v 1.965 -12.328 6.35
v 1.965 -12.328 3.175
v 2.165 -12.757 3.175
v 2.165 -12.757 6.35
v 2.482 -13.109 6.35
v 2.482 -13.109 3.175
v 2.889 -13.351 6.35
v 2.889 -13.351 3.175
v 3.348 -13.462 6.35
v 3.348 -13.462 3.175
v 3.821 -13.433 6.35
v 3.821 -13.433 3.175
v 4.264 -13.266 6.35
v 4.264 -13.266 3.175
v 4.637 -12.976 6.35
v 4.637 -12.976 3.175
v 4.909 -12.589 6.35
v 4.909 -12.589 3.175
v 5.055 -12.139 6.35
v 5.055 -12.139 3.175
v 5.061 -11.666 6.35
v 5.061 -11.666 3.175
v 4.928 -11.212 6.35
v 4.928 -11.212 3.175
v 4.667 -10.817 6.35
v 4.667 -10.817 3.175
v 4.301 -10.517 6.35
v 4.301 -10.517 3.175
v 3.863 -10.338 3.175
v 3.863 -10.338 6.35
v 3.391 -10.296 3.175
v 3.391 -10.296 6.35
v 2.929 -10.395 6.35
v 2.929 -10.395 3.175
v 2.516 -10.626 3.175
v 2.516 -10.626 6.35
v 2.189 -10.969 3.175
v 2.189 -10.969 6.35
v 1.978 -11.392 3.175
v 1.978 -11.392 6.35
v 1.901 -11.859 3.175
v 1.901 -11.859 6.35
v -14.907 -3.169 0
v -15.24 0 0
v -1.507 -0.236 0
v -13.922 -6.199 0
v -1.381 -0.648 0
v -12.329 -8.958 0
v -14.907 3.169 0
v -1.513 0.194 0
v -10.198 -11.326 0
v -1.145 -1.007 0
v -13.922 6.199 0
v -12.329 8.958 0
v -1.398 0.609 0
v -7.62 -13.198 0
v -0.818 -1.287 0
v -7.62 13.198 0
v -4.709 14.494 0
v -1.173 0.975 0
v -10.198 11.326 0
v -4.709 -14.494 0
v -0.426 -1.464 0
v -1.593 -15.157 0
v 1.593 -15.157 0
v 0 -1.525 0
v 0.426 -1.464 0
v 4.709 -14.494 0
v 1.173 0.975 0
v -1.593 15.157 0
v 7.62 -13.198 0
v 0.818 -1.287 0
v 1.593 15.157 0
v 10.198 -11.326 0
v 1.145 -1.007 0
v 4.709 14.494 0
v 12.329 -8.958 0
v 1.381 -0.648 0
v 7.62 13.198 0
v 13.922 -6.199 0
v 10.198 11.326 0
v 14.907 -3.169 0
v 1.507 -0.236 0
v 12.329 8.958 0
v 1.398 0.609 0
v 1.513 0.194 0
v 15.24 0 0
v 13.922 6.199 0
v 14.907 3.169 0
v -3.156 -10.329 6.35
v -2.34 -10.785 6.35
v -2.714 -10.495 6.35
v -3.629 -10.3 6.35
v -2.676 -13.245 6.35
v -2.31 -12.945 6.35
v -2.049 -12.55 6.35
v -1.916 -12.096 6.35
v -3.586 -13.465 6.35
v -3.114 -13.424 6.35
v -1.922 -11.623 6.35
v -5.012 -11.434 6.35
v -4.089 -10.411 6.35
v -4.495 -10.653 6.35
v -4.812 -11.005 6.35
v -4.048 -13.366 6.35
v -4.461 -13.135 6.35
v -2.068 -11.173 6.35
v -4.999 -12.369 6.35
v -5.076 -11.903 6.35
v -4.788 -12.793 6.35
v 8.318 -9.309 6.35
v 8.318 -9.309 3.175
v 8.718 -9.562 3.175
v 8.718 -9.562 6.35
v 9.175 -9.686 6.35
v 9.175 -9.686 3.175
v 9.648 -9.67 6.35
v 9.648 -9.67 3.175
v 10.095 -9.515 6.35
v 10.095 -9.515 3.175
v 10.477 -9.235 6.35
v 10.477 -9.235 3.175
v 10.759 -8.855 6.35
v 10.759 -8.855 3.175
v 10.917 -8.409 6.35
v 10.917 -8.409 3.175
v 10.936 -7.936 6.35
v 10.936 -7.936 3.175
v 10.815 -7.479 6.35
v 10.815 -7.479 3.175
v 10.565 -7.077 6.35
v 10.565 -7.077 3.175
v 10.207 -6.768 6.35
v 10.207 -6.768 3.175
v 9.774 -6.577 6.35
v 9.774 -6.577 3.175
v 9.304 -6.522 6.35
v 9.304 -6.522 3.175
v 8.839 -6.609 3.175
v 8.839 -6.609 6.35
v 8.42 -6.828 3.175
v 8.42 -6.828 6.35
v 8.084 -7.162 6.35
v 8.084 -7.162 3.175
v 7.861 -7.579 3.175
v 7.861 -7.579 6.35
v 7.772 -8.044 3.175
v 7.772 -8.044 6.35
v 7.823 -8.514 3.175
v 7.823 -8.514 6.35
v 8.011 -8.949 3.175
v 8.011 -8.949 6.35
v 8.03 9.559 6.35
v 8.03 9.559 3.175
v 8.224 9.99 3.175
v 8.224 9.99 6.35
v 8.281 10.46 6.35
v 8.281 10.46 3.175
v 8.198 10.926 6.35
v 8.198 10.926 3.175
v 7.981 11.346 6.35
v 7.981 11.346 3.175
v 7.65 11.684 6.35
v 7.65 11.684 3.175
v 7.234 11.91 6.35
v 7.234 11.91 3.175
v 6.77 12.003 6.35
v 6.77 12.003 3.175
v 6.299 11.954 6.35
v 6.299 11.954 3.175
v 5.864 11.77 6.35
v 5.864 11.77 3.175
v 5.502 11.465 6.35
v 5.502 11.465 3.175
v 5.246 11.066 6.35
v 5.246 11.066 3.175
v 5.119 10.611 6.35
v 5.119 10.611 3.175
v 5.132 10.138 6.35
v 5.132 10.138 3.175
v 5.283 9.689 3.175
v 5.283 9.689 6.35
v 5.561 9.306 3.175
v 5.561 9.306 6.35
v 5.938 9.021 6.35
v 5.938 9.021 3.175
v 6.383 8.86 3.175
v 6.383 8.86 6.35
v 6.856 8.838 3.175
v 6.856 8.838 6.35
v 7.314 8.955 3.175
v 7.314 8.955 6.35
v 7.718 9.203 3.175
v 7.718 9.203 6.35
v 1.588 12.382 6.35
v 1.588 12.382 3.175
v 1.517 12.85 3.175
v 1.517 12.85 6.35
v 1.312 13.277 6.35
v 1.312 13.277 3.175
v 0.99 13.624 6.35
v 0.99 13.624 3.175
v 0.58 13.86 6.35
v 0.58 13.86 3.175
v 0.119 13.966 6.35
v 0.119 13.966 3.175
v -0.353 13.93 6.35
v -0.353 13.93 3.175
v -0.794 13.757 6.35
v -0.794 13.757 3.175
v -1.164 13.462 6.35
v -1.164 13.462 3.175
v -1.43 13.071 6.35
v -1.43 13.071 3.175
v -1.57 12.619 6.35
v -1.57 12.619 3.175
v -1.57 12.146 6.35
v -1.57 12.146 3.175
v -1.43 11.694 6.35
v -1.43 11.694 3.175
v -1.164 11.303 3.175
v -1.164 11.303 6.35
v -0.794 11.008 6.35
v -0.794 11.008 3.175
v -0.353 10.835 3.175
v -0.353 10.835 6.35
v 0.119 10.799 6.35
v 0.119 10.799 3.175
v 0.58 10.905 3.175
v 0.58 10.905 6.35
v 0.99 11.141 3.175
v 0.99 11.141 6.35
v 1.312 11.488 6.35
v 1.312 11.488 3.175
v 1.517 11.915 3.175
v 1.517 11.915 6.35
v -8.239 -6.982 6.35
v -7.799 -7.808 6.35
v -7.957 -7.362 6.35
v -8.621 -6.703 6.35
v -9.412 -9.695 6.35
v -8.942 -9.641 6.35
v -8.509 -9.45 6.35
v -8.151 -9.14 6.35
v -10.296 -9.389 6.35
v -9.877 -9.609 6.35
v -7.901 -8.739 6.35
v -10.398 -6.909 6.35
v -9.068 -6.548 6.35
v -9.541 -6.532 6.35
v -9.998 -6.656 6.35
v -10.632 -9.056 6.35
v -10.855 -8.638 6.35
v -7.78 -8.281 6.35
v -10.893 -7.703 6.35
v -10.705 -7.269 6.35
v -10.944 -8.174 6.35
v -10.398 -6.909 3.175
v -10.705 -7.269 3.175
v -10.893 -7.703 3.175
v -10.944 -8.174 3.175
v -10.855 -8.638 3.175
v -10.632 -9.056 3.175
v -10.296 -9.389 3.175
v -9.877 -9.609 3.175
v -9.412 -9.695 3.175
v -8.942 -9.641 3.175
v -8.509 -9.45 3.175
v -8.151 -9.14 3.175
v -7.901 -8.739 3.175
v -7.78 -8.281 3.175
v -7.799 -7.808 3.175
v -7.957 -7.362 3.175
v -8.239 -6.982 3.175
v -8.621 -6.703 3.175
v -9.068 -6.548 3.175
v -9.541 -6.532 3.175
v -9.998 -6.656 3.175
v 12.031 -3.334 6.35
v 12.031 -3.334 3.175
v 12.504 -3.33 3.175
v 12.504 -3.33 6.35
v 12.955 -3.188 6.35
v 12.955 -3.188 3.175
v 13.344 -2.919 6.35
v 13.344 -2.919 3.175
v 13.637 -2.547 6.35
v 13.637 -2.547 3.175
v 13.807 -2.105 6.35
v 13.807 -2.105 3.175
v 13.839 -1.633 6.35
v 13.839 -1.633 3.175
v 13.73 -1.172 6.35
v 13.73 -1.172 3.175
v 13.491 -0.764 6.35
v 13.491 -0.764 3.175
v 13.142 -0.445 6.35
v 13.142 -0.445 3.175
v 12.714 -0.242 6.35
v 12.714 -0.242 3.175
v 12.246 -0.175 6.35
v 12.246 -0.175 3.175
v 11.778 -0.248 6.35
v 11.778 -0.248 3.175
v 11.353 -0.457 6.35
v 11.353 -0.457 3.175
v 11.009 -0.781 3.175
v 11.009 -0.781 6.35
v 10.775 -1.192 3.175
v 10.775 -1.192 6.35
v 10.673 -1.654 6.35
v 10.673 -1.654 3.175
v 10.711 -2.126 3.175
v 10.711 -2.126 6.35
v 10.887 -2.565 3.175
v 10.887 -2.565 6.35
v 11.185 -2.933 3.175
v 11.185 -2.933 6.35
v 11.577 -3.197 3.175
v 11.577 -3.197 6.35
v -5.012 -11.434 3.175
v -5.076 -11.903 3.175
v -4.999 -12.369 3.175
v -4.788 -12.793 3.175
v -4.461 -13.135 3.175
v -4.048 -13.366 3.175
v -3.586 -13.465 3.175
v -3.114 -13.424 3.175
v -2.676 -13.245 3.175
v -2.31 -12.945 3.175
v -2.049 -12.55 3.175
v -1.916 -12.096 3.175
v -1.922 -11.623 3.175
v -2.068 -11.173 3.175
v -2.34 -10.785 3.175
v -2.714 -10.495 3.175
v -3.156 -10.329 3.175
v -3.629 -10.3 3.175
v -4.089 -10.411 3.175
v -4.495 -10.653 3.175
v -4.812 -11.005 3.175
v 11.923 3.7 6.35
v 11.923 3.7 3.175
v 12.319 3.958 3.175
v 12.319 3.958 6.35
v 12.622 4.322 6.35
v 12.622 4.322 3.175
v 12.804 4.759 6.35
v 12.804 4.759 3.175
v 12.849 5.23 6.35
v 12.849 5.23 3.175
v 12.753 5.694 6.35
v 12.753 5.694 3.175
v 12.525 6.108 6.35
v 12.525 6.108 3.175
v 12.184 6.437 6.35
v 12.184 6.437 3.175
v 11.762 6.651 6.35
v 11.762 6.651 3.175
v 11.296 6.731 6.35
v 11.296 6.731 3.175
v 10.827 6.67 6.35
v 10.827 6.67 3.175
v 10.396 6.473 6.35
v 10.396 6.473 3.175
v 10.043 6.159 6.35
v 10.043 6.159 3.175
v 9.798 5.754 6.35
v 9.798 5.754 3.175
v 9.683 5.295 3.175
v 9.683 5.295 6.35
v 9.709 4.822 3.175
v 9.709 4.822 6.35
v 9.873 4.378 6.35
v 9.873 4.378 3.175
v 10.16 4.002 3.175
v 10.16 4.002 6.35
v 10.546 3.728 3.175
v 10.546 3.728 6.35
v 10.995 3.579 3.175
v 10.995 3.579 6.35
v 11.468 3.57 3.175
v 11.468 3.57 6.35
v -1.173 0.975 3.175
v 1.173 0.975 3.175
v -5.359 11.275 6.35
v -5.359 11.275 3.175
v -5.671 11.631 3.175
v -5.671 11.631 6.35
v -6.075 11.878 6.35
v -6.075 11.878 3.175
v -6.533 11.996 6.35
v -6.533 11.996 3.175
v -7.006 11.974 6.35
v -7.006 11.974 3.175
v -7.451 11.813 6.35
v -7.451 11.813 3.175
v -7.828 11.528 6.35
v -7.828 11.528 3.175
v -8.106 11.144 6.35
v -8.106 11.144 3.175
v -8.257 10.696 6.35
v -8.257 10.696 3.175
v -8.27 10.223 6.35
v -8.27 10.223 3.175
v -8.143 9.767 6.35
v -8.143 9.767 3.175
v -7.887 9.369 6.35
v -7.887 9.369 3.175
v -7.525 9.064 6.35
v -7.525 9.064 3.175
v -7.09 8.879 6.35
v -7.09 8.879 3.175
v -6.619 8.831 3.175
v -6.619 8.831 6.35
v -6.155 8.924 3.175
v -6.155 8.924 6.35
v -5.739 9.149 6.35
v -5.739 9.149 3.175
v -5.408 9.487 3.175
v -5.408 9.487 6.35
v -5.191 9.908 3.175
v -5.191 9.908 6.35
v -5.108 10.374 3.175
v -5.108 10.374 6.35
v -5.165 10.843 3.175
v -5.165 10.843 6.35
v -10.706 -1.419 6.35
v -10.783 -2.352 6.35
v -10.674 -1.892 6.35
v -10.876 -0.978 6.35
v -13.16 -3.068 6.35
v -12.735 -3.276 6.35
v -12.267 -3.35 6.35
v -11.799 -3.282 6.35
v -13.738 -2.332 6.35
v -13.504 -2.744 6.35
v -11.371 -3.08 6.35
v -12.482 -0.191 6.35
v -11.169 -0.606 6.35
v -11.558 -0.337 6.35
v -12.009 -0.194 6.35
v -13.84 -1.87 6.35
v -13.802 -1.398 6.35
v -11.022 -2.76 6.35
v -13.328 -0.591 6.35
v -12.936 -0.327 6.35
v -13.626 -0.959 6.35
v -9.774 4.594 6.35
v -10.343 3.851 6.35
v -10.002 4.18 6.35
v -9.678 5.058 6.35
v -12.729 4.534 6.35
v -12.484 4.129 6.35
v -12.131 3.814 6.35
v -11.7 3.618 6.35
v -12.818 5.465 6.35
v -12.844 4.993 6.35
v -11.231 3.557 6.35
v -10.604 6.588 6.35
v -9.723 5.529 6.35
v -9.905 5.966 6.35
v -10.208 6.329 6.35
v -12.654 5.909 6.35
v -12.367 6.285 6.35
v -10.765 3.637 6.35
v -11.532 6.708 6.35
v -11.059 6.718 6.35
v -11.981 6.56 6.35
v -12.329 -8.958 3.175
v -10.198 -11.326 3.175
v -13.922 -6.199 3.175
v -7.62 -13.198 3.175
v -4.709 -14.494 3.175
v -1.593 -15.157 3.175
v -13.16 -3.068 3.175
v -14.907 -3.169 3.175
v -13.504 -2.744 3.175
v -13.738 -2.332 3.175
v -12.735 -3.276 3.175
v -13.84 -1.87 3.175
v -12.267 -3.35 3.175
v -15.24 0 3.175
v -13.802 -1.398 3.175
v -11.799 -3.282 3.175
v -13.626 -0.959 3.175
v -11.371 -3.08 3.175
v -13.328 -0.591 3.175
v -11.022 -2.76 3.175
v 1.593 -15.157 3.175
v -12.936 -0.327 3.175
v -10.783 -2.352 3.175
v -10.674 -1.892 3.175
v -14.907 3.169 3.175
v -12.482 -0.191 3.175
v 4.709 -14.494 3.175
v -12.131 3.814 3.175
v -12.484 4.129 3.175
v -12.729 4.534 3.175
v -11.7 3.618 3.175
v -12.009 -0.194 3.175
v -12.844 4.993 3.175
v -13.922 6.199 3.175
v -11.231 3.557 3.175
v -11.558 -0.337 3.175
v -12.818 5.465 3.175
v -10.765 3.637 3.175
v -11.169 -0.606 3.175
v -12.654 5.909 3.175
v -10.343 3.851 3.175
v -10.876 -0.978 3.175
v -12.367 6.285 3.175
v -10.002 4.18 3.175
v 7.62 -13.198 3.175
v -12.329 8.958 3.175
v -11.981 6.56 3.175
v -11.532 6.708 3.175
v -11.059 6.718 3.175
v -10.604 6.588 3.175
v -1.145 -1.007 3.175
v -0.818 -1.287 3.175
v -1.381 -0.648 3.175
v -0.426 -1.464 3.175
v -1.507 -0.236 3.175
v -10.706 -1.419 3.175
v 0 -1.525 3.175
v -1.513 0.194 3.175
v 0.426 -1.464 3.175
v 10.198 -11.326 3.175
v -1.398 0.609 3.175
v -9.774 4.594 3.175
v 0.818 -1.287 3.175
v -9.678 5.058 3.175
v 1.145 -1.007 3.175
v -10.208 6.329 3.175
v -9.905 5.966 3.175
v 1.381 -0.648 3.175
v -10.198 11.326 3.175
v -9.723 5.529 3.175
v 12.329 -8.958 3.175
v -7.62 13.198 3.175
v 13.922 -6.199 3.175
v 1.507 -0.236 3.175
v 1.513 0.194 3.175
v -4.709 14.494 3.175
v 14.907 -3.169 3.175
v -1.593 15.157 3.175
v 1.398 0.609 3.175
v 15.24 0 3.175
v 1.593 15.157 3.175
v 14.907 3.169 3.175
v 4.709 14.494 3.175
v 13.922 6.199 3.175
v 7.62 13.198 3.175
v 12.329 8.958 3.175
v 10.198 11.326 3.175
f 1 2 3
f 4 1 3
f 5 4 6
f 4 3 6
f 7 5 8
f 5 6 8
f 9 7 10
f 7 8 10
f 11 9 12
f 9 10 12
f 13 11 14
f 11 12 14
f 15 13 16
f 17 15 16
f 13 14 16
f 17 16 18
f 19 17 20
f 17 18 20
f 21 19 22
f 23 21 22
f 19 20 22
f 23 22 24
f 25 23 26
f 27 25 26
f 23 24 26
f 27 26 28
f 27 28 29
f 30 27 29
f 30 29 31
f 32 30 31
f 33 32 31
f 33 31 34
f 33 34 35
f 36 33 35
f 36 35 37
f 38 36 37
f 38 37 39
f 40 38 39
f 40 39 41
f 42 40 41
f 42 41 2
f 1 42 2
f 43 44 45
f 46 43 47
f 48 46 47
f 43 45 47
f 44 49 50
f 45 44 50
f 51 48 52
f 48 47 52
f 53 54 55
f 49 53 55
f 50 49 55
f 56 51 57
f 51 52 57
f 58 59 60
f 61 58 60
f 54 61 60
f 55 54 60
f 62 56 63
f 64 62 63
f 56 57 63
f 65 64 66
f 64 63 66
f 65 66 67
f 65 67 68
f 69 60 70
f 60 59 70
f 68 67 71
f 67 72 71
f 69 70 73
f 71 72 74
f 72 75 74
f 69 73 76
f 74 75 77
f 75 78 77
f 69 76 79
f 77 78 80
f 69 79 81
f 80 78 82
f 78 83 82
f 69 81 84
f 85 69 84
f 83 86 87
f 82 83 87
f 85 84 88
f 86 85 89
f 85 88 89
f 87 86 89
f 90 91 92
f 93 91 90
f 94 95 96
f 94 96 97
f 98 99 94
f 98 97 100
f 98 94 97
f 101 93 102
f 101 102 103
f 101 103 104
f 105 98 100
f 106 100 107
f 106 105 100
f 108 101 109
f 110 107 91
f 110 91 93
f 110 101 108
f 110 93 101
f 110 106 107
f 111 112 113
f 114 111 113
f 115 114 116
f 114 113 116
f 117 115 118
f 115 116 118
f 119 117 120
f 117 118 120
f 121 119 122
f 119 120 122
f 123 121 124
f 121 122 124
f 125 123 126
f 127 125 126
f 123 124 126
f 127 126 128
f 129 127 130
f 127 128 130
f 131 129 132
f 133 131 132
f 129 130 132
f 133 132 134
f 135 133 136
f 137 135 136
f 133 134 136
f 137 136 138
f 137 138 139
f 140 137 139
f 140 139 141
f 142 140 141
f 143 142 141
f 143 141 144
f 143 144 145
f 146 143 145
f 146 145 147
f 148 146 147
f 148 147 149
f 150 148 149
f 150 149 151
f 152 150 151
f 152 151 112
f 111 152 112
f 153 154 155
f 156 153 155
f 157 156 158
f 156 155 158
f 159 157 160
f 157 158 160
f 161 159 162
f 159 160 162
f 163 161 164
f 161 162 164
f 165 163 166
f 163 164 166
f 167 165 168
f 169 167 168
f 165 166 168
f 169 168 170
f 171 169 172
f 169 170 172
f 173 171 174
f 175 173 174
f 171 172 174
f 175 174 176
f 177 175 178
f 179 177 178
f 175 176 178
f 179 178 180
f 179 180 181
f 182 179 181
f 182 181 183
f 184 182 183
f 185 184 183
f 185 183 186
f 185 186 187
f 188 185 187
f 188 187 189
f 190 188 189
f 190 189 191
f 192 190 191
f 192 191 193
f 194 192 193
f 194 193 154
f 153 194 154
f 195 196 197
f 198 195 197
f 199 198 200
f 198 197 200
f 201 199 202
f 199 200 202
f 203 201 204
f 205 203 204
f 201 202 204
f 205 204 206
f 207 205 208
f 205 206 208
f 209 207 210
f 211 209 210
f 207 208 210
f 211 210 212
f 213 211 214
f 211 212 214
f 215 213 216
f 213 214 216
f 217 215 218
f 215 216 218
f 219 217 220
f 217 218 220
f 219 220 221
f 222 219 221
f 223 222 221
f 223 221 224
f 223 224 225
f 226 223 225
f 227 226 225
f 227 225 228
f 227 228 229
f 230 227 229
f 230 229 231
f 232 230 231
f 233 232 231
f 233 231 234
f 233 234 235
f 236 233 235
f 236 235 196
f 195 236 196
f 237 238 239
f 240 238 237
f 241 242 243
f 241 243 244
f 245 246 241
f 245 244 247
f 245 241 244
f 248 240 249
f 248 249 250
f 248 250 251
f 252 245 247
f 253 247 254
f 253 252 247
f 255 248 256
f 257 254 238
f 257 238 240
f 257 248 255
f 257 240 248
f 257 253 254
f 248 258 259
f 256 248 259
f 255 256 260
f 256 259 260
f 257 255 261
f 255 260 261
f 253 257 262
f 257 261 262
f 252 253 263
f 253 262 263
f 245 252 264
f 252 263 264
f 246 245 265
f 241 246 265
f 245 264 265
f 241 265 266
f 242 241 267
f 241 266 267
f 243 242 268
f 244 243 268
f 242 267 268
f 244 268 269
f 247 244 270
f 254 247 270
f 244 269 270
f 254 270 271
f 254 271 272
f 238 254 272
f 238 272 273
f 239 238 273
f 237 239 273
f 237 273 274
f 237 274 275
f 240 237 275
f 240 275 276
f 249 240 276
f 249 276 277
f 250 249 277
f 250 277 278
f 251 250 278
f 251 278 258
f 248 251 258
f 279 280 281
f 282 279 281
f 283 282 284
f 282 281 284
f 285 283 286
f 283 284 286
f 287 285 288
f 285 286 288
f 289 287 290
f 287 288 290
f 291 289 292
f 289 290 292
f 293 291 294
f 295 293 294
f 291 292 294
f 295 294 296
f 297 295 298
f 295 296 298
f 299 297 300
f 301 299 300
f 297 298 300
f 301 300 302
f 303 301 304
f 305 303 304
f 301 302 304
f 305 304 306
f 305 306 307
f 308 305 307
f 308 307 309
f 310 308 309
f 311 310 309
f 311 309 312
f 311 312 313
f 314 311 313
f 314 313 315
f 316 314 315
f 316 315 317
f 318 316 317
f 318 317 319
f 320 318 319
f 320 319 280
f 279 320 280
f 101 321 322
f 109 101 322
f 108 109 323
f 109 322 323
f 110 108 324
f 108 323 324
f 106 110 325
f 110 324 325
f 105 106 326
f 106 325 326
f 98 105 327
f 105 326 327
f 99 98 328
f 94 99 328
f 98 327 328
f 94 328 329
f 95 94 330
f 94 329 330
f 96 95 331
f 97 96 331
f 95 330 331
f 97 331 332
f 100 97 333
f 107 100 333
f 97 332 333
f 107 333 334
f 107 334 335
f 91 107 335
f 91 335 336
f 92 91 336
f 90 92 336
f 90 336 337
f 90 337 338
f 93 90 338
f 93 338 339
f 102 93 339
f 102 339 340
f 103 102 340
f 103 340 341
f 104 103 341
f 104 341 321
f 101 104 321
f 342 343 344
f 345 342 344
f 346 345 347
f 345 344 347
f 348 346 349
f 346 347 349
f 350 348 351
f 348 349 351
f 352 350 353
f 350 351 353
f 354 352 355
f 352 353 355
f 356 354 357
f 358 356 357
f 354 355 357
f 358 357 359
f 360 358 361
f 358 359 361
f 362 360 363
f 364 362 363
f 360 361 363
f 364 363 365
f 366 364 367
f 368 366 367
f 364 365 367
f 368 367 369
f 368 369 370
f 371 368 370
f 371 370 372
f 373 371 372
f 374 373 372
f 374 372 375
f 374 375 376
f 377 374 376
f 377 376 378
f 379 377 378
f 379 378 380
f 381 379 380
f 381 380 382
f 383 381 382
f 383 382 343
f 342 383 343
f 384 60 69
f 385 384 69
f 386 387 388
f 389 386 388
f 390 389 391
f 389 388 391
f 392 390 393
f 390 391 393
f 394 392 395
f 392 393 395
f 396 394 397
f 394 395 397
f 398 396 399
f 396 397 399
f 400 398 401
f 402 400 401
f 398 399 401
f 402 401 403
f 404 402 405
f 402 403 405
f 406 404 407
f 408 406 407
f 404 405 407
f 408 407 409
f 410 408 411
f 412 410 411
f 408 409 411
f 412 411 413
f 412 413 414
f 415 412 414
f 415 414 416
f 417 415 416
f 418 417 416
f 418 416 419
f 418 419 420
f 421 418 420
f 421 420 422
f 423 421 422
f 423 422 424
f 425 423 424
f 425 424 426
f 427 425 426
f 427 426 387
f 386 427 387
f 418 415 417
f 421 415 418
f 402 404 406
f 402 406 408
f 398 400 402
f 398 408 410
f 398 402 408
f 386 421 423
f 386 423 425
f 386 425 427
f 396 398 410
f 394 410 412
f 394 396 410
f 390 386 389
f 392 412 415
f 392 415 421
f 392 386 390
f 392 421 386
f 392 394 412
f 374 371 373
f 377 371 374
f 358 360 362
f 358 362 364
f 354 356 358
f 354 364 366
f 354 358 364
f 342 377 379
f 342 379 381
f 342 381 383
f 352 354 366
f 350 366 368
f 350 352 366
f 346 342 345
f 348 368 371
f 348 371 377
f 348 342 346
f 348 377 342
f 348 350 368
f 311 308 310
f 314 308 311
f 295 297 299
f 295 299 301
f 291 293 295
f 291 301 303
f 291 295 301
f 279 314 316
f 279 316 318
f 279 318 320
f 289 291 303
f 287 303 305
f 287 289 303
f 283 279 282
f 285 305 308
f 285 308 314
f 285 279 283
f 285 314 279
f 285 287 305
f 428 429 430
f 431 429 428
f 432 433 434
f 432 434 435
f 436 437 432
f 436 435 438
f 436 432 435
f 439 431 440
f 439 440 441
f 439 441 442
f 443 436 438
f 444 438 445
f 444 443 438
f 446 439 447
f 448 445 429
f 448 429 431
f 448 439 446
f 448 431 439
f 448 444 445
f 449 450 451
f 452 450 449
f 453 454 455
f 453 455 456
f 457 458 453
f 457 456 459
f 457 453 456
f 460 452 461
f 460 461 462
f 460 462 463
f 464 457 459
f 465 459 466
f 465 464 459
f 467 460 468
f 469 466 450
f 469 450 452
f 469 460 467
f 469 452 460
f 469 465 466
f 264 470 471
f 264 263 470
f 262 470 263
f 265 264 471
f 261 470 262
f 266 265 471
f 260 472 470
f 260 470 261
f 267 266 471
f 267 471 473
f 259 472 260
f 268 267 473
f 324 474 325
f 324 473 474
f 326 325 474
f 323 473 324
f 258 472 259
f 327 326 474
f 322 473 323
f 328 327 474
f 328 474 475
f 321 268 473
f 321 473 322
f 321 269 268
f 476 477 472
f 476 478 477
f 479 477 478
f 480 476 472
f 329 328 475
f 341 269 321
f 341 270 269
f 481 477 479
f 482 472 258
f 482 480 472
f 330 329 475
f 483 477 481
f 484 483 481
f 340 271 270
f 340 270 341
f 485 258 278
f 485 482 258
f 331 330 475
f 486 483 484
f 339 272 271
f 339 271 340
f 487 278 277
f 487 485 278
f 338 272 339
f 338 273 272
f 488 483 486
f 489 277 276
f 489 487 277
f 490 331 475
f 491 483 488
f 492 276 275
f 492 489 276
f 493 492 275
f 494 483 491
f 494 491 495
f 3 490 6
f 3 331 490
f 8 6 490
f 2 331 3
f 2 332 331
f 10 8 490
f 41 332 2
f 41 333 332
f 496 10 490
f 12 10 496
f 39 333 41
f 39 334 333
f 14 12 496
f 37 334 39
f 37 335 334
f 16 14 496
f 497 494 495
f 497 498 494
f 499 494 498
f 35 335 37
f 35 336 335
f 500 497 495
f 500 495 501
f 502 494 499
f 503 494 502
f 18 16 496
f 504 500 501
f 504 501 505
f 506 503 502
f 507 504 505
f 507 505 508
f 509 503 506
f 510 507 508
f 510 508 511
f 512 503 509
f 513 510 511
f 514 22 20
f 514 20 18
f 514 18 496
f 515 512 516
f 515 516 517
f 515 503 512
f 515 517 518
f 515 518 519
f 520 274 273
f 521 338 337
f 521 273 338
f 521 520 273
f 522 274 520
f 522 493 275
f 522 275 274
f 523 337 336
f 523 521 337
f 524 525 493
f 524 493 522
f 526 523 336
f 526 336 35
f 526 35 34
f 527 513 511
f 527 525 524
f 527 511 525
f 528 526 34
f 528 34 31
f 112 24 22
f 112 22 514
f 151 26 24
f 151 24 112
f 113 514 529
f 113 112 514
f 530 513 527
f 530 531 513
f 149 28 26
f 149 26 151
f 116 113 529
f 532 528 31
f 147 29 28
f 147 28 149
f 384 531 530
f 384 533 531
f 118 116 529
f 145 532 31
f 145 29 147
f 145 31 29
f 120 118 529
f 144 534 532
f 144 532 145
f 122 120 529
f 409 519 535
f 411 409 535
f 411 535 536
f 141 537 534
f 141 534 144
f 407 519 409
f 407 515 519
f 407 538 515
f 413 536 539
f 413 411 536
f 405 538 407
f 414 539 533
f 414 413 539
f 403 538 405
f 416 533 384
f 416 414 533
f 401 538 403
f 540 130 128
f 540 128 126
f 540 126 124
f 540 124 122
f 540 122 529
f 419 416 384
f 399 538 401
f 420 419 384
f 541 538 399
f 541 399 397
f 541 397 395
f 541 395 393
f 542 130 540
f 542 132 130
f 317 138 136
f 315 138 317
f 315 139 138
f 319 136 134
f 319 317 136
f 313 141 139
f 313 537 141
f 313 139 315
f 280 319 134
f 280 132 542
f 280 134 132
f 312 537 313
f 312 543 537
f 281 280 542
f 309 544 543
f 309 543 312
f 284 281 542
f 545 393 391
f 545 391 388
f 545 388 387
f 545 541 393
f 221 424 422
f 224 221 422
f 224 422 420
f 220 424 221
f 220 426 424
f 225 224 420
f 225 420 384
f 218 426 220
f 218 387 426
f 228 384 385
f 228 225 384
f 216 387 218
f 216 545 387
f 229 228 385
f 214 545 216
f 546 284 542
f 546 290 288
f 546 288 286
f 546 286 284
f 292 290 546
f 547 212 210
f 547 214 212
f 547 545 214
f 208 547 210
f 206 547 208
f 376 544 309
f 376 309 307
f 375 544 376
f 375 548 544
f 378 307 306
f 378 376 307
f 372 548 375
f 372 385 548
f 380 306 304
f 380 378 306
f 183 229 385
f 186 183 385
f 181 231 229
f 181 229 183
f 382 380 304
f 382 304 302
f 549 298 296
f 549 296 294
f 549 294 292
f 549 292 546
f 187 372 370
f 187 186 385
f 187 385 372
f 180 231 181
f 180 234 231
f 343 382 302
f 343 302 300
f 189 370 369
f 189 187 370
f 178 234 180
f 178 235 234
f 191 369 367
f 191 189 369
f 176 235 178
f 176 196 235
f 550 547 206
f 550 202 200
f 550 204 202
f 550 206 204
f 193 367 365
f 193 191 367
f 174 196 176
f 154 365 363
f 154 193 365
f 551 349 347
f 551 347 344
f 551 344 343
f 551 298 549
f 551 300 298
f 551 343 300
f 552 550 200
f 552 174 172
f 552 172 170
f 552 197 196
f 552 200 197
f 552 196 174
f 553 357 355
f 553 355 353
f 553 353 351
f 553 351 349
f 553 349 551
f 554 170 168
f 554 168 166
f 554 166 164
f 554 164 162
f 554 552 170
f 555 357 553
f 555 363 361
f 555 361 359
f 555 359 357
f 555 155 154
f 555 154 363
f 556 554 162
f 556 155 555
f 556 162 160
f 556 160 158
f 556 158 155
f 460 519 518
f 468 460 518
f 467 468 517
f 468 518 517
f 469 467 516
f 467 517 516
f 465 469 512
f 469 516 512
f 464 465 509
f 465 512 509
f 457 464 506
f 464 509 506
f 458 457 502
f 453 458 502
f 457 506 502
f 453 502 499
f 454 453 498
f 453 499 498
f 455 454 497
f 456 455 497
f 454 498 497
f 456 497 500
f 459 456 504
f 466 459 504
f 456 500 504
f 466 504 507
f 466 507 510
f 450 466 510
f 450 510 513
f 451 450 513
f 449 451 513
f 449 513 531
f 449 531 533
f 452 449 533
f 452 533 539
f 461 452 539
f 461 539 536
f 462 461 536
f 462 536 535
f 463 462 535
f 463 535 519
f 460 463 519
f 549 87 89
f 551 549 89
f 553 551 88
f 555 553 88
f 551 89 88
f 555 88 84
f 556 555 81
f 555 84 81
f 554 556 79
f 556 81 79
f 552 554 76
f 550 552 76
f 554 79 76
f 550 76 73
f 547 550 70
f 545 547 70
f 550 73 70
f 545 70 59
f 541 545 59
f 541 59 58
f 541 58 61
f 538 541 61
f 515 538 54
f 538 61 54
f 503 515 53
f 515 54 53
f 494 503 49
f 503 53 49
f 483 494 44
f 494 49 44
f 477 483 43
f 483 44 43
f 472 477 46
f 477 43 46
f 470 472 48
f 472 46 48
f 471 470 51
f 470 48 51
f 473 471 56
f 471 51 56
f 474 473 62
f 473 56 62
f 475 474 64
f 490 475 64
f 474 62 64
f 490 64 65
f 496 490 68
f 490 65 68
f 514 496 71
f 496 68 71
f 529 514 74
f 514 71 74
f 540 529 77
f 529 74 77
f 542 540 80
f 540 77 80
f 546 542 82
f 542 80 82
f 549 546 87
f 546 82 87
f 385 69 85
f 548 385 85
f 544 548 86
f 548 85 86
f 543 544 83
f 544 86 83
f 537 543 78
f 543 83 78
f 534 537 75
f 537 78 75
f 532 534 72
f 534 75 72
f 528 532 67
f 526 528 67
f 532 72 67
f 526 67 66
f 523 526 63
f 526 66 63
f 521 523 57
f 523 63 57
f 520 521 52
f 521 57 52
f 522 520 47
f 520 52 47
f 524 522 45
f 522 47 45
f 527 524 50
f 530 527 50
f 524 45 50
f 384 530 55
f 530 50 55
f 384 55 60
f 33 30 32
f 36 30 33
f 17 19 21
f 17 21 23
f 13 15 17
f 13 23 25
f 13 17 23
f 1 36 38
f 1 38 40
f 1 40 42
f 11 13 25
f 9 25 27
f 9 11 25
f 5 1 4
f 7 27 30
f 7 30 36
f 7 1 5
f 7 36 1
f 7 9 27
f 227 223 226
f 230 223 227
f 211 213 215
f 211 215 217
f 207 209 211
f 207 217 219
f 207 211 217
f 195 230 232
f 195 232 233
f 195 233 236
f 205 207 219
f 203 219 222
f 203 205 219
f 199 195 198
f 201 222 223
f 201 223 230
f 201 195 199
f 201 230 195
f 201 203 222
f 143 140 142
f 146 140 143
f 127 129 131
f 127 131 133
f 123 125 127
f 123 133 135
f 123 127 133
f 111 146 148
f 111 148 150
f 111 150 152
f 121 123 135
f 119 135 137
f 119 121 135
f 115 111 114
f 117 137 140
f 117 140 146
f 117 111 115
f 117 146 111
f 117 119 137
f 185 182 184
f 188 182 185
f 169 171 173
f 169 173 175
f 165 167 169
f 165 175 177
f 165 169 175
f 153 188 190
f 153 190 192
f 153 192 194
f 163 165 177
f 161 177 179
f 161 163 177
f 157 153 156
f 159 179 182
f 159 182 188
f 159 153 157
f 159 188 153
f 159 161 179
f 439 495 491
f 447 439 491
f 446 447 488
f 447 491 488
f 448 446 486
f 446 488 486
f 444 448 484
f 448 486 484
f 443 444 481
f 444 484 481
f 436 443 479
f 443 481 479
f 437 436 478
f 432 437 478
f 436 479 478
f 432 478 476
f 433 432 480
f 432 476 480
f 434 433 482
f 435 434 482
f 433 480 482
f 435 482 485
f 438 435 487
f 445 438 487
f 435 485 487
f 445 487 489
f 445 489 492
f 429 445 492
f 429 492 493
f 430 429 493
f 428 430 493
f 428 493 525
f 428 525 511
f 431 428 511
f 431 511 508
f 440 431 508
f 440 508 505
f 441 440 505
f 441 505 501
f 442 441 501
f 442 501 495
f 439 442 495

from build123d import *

# Parameters (mm, degrees)
SKETCH1_R           = 15.24
SKETCH1_R_2         = 1.5875
BOSS_EXTRUDE1_DEPTH = 3.175
SKETCH1_3_R         = 1.5875
BOSS_EXTRUDE2_DEPTH = 6.35
CIRPATTERN1_COUNT   = 11


with BuildPart() as part:
    # Sketch1 → Boss-Extrude1 (new body)
    with BuildSketch(Plane.XY):
        Circle(SKETCH1_R)
        with Locations((0, 12.3825)):
            Circle(SKETCH1_R_2, mode=Mode.SUBTRACT)
        with BuildLine():
            Line((-1.1725, 0.975124992), (1.1725, 0.975124992))
            ThreePointArc((1.1725, 0.975124992), (0, -1.525), (-1.1725, 0.975124992))
        make_face(mode=Mode.SUBTRACT)
    extrude(amount=BOSS_EXTRUDE1_DEPTH)

    # Sketch1<3> → Boss-Extrude2 (add)
    with BuildSketch(Plane.XY):
        with Locations((0, 12.3825)):
            Circle(SKETCH1_3_R)
    boss_extrude2 = extrude(amount=BOSS_EXTRUDE2_DEPTH)

    # CirPattern1: Boss-Extrude2 ×11 about axis
    cirpattern1_axis = Axis((0, 0, 0), (0, 0, 1))
    for i in range(1, CIRPATTERN1_COUNT):
        add(boss_extrude2.rotate(cirpattern1_axis, i * 360 / CIRPATTERN1_COUNT))


solid = part.part
